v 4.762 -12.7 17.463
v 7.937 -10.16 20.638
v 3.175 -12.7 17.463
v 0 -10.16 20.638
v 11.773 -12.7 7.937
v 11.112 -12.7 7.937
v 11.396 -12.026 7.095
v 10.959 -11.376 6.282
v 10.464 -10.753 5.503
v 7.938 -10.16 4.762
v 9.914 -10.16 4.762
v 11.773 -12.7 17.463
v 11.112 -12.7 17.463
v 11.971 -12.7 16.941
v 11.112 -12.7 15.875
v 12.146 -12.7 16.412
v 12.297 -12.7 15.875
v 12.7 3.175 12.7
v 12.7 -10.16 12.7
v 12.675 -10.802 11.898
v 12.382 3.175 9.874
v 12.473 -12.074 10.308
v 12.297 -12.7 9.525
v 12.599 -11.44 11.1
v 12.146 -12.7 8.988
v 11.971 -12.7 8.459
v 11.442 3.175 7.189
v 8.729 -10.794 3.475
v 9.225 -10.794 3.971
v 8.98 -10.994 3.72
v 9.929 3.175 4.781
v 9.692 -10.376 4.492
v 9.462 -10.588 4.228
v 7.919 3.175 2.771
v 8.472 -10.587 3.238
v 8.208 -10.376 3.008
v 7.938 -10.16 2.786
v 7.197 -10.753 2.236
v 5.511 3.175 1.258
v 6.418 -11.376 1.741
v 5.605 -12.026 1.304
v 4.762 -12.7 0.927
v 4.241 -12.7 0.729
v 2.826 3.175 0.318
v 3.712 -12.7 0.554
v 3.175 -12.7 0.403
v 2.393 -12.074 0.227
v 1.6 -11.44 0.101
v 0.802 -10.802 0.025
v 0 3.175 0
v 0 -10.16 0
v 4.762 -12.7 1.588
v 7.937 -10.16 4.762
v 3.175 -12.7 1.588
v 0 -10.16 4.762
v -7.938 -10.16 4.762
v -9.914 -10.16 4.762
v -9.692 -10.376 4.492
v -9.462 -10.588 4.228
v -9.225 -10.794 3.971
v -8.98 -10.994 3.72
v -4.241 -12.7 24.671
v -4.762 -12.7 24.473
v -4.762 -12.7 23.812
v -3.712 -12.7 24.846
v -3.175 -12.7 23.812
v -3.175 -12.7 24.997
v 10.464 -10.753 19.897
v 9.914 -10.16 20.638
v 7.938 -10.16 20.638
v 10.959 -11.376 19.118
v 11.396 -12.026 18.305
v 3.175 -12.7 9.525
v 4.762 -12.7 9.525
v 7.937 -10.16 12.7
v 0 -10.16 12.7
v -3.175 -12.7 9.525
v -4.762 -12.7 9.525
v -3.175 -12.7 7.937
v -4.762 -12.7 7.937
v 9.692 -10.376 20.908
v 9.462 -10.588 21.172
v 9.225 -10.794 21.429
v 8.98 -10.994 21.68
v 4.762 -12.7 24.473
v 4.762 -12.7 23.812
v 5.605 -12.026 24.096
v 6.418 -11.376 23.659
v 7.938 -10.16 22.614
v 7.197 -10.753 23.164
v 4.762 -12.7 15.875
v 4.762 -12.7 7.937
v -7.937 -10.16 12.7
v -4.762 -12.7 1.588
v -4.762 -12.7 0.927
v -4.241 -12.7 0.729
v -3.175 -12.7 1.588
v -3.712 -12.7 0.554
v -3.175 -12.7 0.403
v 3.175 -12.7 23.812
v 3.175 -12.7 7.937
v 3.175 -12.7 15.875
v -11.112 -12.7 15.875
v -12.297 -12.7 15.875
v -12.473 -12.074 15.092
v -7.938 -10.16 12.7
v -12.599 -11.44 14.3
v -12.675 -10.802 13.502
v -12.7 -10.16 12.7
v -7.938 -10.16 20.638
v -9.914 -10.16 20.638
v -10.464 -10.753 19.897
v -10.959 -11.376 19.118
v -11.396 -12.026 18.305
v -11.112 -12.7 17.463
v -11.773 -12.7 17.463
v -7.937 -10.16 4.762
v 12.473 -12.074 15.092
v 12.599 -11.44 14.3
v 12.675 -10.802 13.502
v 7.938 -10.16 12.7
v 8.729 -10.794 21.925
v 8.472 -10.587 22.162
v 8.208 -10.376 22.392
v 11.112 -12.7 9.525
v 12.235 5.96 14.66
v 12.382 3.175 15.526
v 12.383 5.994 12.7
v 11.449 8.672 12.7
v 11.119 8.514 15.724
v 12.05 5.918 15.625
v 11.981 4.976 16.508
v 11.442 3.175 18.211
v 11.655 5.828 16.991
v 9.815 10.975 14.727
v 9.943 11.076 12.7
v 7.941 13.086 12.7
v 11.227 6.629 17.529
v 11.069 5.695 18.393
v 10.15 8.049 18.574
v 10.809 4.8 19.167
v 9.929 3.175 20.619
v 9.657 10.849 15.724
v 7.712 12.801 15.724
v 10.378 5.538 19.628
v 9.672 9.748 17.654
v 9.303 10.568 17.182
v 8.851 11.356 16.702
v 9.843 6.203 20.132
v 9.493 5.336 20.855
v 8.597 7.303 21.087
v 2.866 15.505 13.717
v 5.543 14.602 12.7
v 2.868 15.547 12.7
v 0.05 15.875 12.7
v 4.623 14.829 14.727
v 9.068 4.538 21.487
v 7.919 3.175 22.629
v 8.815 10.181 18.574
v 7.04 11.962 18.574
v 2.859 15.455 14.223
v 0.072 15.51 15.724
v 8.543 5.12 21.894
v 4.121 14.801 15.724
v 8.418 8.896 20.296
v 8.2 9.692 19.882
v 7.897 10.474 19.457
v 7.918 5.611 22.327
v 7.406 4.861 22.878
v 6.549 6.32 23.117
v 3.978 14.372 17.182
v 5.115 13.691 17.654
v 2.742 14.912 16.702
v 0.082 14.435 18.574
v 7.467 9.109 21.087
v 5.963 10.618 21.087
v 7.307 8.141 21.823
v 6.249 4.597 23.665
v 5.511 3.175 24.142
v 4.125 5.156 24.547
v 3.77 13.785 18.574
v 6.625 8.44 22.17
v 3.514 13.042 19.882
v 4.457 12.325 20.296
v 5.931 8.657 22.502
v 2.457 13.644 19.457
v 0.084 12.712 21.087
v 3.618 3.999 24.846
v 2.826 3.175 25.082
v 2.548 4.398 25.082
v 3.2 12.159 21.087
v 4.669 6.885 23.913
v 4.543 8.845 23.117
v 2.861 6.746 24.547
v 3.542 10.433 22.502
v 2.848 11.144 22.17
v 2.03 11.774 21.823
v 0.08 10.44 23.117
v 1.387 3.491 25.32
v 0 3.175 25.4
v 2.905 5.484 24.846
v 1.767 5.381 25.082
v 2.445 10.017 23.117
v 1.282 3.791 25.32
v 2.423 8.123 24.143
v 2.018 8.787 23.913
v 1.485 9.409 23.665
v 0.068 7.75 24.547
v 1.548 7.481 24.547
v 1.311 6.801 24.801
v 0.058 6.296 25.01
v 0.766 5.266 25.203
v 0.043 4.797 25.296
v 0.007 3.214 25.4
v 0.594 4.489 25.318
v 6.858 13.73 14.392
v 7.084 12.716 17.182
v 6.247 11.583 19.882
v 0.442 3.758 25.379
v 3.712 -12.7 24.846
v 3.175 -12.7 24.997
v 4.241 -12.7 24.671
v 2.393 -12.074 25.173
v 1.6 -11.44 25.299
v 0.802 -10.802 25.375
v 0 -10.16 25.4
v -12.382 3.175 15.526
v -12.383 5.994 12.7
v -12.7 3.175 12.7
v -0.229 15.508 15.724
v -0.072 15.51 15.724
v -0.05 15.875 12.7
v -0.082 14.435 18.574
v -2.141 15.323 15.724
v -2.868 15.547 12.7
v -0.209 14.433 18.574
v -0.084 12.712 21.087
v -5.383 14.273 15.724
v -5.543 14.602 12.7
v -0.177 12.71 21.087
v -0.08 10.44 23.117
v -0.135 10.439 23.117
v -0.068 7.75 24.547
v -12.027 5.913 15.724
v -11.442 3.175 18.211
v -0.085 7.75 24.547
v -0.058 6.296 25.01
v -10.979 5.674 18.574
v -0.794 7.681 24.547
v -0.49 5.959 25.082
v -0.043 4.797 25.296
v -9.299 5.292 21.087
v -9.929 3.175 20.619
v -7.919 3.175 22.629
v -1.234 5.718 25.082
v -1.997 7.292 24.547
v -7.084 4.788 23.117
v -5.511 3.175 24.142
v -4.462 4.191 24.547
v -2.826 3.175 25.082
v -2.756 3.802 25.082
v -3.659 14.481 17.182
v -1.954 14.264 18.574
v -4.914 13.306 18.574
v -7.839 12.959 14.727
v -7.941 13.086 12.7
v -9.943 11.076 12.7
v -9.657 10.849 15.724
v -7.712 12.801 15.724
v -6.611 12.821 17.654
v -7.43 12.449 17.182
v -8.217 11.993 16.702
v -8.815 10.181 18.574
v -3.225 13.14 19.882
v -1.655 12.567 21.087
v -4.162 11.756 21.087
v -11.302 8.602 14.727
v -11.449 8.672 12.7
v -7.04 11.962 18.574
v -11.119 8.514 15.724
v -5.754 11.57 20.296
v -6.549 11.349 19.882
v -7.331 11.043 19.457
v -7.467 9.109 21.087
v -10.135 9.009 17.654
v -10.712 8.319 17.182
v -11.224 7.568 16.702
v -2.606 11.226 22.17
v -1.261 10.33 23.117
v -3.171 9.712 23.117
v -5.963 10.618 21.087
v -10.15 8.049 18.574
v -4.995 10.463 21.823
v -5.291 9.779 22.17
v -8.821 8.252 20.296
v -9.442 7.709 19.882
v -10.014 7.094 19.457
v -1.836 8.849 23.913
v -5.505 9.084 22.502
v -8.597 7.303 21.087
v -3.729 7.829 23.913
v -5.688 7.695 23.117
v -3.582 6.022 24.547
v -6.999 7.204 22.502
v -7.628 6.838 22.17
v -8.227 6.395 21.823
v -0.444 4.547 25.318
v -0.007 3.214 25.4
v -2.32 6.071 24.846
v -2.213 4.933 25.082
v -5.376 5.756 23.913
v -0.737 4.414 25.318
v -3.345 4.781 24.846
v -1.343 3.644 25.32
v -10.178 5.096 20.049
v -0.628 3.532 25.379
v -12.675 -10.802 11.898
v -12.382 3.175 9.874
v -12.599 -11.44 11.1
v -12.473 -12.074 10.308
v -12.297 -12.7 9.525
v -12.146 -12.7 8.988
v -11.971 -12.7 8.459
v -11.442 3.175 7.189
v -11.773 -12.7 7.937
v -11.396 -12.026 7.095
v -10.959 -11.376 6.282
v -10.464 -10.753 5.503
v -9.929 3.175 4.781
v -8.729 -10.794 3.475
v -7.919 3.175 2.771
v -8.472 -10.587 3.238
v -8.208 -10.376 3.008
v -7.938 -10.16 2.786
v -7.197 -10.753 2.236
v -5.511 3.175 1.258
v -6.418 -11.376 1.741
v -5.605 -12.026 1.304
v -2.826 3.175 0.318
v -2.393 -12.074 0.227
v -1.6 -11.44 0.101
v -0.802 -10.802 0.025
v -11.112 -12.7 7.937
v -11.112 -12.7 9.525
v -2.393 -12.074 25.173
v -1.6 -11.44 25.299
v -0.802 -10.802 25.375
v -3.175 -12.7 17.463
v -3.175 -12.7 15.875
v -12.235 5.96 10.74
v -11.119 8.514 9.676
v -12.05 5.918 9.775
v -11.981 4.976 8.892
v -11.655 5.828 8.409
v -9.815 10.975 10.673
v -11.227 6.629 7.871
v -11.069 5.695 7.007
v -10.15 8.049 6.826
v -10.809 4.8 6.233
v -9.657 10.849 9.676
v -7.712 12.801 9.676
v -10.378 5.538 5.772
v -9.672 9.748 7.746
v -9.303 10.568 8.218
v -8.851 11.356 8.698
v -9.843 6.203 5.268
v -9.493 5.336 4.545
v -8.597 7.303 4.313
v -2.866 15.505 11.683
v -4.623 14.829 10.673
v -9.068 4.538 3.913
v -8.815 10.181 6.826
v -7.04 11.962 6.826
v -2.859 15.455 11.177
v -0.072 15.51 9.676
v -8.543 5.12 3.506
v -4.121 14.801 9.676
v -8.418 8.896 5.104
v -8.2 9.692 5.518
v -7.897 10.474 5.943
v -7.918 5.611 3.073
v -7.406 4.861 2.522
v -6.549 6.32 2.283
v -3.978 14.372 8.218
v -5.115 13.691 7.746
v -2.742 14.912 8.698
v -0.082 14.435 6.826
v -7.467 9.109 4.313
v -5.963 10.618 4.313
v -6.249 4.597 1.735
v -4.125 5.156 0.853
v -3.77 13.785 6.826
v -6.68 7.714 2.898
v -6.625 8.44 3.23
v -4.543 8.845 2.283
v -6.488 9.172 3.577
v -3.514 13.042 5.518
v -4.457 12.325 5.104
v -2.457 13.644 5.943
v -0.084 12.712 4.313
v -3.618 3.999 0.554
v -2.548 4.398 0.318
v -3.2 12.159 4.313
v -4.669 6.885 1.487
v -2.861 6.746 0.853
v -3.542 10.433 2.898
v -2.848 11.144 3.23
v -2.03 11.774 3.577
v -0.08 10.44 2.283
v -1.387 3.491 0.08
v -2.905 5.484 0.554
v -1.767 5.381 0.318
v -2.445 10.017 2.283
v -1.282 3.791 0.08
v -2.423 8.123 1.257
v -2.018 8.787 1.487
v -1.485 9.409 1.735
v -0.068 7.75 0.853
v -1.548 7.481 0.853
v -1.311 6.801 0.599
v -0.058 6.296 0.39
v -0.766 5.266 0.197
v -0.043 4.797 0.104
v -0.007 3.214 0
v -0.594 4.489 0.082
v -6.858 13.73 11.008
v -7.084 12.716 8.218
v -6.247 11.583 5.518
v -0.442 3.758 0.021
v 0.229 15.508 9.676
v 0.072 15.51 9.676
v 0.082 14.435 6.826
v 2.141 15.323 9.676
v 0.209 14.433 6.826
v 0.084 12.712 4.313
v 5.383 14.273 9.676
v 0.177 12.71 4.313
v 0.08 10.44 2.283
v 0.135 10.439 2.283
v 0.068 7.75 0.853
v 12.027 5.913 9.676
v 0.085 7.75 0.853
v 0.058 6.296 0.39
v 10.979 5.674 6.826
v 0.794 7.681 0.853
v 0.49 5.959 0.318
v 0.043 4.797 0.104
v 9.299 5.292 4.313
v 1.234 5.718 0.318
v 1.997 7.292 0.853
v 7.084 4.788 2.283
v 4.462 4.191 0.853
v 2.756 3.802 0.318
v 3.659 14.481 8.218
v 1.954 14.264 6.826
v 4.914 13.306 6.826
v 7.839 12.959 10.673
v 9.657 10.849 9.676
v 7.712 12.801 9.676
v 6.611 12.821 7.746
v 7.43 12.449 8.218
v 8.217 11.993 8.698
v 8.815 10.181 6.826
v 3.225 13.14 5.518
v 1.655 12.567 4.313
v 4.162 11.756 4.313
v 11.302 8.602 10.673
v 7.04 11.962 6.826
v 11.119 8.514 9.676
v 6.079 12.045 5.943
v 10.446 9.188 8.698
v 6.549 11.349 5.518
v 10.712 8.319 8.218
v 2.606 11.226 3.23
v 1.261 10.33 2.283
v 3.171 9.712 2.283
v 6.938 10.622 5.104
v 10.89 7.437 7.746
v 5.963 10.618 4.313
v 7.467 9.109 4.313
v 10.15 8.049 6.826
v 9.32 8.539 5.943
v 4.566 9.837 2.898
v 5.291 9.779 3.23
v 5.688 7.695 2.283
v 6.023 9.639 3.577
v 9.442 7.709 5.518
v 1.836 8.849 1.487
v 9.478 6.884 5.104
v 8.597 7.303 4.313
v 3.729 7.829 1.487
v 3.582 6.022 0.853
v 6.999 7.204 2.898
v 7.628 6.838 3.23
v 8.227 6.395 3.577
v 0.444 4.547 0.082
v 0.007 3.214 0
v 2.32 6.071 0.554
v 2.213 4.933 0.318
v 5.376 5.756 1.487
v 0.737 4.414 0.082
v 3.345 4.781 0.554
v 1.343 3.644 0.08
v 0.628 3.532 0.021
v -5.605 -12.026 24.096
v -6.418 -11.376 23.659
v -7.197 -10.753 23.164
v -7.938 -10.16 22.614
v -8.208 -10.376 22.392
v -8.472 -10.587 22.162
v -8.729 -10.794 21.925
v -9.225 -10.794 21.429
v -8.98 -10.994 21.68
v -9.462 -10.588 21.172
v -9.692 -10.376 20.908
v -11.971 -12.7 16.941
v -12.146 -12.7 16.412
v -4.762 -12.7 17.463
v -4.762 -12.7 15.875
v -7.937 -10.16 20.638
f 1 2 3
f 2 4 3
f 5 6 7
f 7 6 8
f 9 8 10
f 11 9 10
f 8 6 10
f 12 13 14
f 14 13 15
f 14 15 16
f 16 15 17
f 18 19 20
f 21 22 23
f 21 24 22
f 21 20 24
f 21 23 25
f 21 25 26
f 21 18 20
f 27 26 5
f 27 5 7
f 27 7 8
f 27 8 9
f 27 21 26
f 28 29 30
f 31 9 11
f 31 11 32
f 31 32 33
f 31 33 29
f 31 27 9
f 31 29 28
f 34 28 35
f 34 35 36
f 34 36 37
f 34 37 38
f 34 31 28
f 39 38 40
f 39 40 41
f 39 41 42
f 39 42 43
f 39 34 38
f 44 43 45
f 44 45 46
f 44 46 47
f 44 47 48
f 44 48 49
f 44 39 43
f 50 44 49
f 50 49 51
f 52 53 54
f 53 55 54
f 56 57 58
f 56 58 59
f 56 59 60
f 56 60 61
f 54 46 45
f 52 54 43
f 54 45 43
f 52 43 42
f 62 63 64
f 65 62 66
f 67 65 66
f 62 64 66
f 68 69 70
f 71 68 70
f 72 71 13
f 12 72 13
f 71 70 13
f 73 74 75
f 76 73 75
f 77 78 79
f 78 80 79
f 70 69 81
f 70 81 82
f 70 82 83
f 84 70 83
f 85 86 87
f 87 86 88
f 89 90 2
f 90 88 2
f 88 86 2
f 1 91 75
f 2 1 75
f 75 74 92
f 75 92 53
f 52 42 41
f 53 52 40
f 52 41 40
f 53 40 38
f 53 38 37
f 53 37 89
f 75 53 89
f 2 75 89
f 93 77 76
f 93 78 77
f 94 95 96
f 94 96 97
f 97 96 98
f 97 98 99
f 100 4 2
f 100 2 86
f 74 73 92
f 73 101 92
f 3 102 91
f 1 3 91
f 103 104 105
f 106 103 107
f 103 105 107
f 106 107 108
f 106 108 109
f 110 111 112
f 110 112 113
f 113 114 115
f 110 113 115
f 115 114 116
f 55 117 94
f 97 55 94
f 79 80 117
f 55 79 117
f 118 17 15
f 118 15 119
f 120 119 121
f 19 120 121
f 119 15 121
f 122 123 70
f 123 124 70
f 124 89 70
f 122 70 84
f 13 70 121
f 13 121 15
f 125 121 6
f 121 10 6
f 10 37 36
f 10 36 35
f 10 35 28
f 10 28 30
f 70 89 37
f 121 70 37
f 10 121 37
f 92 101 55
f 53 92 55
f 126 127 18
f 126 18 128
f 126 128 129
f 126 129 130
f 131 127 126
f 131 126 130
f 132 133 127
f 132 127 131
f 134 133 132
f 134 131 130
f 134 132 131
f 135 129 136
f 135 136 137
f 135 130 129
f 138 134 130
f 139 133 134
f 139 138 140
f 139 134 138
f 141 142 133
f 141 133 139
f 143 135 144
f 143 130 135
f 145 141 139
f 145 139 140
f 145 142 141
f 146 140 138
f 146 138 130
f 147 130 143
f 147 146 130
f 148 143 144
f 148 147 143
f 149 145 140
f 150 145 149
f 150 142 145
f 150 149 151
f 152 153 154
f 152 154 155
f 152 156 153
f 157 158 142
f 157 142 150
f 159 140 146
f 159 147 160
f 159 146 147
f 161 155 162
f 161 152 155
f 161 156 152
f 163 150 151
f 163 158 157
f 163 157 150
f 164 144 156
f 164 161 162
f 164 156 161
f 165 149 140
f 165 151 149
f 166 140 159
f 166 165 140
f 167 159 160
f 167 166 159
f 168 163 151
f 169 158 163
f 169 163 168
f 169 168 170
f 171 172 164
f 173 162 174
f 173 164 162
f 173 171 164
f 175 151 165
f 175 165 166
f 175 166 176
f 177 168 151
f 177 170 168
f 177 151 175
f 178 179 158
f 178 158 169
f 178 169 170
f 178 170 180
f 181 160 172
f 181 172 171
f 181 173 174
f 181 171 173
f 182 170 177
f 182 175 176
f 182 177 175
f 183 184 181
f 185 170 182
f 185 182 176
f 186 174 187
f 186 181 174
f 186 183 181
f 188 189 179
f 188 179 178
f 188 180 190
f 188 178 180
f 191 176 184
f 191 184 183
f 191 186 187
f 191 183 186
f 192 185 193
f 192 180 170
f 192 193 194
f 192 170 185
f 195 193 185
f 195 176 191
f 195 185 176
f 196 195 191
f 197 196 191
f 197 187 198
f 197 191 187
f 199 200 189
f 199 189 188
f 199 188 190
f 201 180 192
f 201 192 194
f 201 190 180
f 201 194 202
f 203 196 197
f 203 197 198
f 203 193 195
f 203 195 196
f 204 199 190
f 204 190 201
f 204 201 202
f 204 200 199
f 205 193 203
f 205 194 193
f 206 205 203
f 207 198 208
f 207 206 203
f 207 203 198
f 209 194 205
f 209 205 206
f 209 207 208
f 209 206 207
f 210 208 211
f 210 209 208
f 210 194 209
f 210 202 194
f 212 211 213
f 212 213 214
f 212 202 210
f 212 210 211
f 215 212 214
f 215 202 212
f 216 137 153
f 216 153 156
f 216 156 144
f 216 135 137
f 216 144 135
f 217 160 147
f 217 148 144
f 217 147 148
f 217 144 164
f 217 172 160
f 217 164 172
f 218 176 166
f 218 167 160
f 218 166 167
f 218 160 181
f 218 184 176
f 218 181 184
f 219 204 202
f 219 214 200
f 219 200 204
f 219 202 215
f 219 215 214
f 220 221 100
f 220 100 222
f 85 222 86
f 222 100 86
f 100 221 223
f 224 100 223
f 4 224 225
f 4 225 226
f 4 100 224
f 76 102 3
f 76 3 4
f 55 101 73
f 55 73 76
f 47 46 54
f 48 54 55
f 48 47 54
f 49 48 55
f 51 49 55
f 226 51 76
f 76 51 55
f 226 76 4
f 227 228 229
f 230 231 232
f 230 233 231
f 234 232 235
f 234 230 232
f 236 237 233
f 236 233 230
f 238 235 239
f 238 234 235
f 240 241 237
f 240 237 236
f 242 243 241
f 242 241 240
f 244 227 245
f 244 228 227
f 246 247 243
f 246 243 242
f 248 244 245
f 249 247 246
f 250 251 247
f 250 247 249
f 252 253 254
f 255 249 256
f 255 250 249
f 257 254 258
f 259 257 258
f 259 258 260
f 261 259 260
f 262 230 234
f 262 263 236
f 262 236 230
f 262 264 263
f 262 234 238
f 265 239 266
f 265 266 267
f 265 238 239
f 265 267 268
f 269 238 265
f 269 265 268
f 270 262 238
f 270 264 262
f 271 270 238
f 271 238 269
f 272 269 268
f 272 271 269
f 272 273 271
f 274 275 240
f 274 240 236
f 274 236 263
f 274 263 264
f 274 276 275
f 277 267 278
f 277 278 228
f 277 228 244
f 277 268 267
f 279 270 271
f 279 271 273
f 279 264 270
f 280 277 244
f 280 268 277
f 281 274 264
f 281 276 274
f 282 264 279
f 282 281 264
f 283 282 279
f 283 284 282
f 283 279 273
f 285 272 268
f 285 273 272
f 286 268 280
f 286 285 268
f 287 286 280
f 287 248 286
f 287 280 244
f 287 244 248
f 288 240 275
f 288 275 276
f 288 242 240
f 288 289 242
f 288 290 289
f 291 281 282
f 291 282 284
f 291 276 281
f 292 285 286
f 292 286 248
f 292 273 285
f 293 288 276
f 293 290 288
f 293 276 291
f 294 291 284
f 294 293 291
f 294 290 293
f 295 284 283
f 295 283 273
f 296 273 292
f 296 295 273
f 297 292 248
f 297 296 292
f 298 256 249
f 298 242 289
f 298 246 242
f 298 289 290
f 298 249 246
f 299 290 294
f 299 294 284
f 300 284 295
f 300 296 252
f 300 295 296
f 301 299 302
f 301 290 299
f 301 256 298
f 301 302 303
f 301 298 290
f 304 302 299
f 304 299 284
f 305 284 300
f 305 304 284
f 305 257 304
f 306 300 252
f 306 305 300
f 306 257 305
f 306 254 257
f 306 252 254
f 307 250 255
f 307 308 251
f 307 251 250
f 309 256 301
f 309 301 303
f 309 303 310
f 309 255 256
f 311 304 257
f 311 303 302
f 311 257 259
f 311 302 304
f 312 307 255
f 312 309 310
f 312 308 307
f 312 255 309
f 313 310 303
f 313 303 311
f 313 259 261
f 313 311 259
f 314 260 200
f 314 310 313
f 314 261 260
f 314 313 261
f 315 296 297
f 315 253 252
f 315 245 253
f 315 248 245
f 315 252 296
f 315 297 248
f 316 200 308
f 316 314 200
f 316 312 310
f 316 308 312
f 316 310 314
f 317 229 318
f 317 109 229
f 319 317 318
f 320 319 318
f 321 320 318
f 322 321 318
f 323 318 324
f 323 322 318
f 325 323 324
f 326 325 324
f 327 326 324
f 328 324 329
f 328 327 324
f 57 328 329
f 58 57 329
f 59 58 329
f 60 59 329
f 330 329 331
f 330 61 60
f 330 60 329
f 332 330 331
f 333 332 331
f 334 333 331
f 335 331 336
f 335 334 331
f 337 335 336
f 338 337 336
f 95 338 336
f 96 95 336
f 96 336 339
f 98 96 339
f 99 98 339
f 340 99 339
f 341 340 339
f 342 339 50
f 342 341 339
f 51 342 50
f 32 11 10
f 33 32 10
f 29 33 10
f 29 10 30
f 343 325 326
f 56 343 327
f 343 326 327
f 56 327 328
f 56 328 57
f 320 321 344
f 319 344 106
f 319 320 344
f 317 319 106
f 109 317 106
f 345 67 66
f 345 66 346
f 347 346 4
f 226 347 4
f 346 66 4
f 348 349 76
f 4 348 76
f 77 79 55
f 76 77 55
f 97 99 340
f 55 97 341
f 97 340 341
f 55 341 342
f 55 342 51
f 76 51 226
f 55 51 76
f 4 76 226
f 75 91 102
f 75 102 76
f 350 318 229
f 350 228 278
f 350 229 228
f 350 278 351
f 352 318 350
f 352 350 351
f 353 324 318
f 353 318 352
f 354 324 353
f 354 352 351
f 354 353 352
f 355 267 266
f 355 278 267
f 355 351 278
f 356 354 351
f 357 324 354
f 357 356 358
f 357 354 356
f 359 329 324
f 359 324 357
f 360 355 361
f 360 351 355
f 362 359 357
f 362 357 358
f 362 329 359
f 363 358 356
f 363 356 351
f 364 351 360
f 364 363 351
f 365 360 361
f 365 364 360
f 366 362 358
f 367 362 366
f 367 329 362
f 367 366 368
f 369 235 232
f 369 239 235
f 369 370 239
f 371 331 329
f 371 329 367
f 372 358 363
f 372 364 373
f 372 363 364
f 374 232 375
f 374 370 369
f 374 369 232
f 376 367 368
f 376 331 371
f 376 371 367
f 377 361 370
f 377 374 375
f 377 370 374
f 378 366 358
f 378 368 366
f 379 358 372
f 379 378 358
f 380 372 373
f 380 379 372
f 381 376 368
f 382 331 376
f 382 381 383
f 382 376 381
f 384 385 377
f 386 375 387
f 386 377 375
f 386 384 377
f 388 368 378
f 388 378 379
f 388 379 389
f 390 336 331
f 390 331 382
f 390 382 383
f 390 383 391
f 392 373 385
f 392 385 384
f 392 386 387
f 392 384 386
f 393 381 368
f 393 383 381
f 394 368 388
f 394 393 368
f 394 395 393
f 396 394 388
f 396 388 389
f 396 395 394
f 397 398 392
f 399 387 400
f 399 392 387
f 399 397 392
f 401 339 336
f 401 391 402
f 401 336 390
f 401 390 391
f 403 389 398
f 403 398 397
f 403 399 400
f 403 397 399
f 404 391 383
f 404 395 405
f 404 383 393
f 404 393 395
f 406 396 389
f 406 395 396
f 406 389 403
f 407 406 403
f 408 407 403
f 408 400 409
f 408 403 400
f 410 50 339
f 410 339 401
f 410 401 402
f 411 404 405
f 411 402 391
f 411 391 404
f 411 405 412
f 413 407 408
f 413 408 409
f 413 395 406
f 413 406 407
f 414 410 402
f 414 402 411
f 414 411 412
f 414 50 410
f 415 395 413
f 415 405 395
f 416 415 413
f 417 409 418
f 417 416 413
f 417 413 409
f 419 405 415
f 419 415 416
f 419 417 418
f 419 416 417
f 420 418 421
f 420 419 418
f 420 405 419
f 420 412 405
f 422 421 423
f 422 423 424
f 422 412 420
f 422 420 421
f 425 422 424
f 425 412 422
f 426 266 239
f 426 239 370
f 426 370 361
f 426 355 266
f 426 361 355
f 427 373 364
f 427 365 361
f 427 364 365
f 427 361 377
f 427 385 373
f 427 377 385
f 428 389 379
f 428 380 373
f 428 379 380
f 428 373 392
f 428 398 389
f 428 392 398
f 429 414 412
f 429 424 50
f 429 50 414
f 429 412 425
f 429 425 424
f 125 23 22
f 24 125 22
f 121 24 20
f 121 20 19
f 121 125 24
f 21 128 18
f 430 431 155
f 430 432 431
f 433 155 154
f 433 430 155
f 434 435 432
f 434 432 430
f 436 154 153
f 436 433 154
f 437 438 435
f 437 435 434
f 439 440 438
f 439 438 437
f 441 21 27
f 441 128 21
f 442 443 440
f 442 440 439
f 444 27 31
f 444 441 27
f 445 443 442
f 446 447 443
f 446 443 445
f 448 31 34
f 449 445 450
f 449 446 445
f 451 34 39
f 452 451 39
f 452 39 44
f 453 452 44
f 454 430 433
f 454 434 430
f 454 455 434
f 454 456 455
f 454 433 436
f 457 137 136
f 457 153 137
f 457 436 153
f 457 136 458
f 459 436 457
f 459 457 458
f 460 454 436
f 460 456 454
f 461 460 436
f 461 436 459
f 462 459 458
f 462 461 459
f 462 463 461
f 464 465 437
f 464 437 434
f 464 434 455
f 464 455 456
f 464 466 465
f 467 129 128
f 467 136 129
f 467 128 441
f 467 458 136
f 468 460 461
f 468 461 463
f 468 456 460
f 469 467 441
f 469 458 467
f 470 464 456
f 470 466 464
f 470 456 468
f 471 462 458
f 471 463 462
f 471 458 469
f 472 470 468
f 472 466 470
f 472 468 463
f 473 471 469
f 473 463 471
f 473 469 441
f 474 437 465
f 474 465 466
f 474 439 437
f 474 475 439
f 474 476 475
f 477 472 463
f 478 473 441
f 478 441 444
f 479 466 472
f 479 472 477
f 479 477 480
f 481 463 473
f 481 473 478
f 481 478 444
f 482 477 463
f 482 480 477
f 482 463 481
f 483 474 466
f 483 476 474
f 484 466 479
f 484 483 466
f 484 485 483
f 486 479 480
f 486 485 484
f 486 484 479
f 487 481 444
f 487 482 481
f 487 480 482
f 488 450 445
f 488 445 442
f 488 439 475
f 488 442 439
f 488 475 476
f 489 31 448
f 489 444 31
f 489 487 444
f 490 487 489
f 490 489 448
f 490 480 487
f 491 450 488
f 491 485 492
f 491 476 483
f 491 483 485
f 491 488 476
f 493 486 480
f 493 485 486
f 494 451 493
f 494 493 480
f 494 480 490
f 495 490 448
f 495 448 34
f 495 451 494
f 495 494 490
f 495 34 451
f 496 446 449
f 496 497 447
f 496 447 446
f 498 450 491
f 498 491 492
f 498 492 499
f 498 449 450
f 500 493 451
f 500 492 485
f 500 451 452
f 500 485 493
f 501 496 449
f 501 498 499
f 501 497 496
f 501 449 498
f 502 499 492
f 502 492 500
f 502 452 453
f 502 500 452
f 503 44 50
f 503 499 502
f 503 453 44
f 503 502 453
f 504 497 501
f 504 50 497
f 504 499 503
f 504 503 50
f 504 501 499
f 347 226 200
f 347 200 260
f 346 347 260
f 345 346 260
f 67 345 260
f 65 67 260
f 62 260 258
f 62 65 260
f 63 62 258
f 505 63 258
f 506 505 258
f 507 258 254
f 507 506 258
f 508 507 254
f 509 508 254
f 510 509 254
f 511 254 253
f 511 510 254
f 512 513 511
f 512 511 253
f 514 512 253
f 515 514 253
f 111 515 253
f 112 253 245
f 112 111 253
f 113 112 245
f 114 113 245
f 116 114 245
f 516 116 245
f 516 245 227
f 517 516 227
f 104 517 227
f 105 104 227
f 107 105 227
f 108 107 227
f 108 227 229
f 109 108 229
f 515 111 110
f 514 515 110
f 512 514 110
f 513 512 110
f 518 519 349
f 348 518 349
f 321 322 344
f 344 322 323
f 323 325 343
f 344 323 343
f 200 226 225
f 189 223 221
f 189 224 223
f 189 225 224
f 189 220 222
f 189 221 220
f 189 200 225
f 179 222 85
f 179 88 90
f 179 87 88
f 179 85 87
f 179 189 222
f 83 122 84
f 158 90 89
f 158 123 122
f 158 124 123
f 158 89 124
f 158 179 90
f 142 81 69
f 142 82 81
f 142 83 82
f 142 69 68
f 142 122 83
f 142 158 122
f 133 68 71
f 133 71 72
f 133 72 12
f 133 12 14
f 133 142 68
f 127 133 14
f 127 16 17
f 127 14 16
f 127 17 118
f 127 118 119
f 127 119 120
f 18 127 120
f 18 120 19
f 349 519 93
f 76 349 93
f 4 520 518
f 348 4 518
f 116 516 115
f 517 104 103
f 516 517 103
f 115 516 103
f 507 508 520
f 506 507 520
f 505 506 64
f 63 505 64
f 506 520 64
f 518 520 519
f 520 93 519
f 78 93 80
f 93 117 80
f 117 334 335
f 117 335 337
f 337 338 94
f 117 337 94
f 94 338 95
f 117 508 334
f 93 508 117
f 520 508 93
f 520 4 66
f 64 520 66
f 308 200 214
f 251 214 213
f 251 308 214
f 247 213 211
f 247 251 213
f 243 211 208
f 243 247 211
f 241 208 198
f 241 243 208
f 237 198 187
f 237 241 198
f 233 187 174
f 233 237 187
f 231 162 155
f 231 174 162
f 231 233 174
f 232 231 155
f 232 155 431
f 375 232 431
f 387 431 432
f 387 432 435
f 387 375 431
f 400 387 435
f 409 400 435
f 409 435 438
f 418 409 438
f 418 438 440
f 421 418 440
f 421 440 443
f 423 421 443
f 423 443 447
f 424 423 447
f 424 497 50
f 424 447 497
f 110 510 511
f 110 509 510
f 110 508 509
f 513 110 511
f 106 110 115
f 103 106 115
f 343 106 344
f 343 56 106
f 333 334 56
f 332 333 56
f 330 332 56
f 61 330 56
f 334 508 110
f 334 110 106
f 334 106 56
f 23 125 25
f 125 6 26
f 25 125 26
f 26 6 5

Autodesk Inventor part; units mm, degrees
ref_plane "YZ Plane" through (0, 0, 0) normal (1, 0, 0) x (0, 1, 0)
ref_plane "XZ Plane" through (0, 0, 0) normal (0, 1, 0) x (-1, 0, 0)
ref_plane "XY Plane" through (0, 0, 0) normal (0, 0, 1) x (1, 0, 0)
sketch "Sketch1" plane through (0, 0, 0) normal (0, 0, 1) x (1, 0, 0)
  arc A0 (12.7, 3.175) -> (-12.7, 3.175) centre (0, 3.175) ccw
  line L0 (-12.7, 3.175) -> (-12.7, -12.7)
  line L1 (-12.7, -12.7) -> (12.7, -12.7)
  line L2 (12.7, -12.7) -> (12.7, 3.175)
  line L3 (-12.7, -12.7) -> (-11.1125, -12.7)
  line L4 (-11.1125, -12.7) -> (-7.9375, -12.7)
  line L5 (-7.9375, -12.7) -> (-7.9375, -10.16)
  line L6 (-7.9375, -10.16) -> (-11.1125, -12.7)
  line L7 (-7.9375, -10.16) -> (-4.7625, -12.7)
  line L8 (12.7, -12.7) -> (11.1125, -12.7)
  line L9 (11.1125, -12.7) -> (7.9375, -12.7)
  line L10 (7.9375, -12.7) -> (7.9375, -10.16)
  line L11 (7.9375, -10.16) -> (11.1125, -12.7)
  line L12 (7.9375, -12.7) -> (4.7625, -12.7)
  line L13 (4.7625, -12.7) -> (7.9375, -10.16)
  line L14 (0, -12.7) -> (0, -10.16)
  line L15 (0, -12.7) -> (3.175, -12.7)
  line L16 (3.175, -12.7) -> (0, -10.16)
  line L17 (0, -12.7) -> (-3.175, -12.7)
  line L18 (-3.175, -12.7) -> (0, -10.16)
  dimension "d5" = 25.4
  dimension "d6" = 15.875
  dimension "d7" = 25.4
  dimension "d8" = 1.5875
  dimension "d9" = 3.175
  dimension "d10" = 2.54
  dimension "d11" = 3.175
  dimension "d12" = 1.5875
  dimension "d13" = 3.175
  dimension "d14" = 2.54
  dimension "d15" = 3.175
  dimension "d16" = 2.54
  dimension "d17" = 3.175
  dimension "d18" = 3.175
extrude "Extrusion1" add sketch "Sketch1" along normal blind 25.4 contours L2 L1 L11 L13 L16 L18 L7 L6 L0 A0
fillet "Fillet1" radius 12.7 6 edges at (-12.7, -4.7625, 25.4) (12.7, -4.7625, 25.4) (0, 15.875, 25.4) (-12.7, -4.7625, 0) (12.7, -4.7625, 0) (0, 15.875, 0)
sketch "Sketch2" plane through (0, 0, 0) normal (1, 0, 0) x (0, 1, 0)
  arc A0 (3.1749, 0) -> (3.1749, 25.4) centre (3.1749, 12.7) ccw
  line L0 (3.1749, 25.4) -> (-12.7001, 25.4)
  line L1 (-12.7001, 25.4) -> (-12.7001, 0)
  line L2 (-12.7001, 0) -> (3.1749, 0)
  line L3 (-12.7001, 25.4) -> (-12.7001, 23.8125)
  line L4 (-12.7001, 23.8125) -> (-12.7001, 20.6375)
  line L5 (-12.7001, 20.6375) -> (-10.1601, 20.6375)
  line L6 (-10.1601, 20.6375) -> (-12.7001, 23.8125)
  line L7 (-10.1601, 20.6375) -> (-12.7001, 17.4625)
  line L8 (-12.7001, 0) -> (-12.7001, 1.5875)
  line L9 (-12.7001, 1.5875) -> (-12.7001, 4.7625)
  line L10 (-12.7001, 4.7625) -> (-10.1601, 4.7625)
  line L11 (-10.1601, 4.7625) -> (-12.7001, 1.5875)
  line L12 (-12.7001, 4.7625) -> (-12.7001, 7.9375)
  line L13 (-12.7001, 7.9375) -> (-10.1601, 4.7625)
  line L14 (-12.7001, 12.7) -> (-10.1601, 12.7)
  line L15 (-12.7001, 12.7) -> (-12.7001, 9.525)
  line L16 (-12.7001, 9.525) -> (-10.1601, 12.7)
  line L17 (-12.7001, 12.7) -> (-12.7001, 15.875)
  line L18 (-12.7001, 15.875) -> (-10.1601, 12.7)
  line L19 (3.175, 25.4) -> (3.175, 0) projected
  point P0 (0, 0)
  dimension "d22" = 25.4
  dimension "d23" = 15.875
  dimension "d24" = 25.4
  dimension "d25" = 1.5875
  dimension "d26" = 3.175
  dimension "d27" = 2.54
  dimension "d28" = 3.175
  dimension "d29" = 1.5875
  dimension "d30" = 3.175
  dimension "d31" = 2.54
  dimension "d32" = 3.175
  dimension "d33" = 2.54
  dimension "d34" = 3.175
  dimension "d35" = 3.175
extrude "Extrusion2" cut sketch "Sketch2" along normal mid plane 25.4 contours L19 A0 | L2 L1 L11 L13 L16 L18 L7 L6 L0 L19 keep common part
equation "\"d6\" = 0.625 * d5"
equation "\"d7\" = d5"
equation "\"d8\" = 0.0625 * d7"
equation "\"d9\" = 0.125 * d7"
equation "\"d11\" = d9"
equation "\"d12\" = d8"
equation "\"d13\" = d9"
equation "\"d14\" = d10"
equation "\"d15\" = d9"
equation "\"d16\" = d10"
equation "\"d17\" = d9"
equation "\"d18\" = d9"
equation "\"d23\" = 0.625 * d22"
equation "\"d24\" = d22"
equation "\"d25\" = 0.0625 * d24"
equation "\"d26\" = 0.125 * d24"
equation "\"d28\" = d26"
equation "\"d29\" = d25"
equation "\"d30\" = d26"
equation "\"d31\" = d27"
equation "\"d32\" = d26"
equation "\"d33\" = d27"
equation "\"d34\" = d26"
equation "\"d35\" = d26"
properties part number "Ghost1"
